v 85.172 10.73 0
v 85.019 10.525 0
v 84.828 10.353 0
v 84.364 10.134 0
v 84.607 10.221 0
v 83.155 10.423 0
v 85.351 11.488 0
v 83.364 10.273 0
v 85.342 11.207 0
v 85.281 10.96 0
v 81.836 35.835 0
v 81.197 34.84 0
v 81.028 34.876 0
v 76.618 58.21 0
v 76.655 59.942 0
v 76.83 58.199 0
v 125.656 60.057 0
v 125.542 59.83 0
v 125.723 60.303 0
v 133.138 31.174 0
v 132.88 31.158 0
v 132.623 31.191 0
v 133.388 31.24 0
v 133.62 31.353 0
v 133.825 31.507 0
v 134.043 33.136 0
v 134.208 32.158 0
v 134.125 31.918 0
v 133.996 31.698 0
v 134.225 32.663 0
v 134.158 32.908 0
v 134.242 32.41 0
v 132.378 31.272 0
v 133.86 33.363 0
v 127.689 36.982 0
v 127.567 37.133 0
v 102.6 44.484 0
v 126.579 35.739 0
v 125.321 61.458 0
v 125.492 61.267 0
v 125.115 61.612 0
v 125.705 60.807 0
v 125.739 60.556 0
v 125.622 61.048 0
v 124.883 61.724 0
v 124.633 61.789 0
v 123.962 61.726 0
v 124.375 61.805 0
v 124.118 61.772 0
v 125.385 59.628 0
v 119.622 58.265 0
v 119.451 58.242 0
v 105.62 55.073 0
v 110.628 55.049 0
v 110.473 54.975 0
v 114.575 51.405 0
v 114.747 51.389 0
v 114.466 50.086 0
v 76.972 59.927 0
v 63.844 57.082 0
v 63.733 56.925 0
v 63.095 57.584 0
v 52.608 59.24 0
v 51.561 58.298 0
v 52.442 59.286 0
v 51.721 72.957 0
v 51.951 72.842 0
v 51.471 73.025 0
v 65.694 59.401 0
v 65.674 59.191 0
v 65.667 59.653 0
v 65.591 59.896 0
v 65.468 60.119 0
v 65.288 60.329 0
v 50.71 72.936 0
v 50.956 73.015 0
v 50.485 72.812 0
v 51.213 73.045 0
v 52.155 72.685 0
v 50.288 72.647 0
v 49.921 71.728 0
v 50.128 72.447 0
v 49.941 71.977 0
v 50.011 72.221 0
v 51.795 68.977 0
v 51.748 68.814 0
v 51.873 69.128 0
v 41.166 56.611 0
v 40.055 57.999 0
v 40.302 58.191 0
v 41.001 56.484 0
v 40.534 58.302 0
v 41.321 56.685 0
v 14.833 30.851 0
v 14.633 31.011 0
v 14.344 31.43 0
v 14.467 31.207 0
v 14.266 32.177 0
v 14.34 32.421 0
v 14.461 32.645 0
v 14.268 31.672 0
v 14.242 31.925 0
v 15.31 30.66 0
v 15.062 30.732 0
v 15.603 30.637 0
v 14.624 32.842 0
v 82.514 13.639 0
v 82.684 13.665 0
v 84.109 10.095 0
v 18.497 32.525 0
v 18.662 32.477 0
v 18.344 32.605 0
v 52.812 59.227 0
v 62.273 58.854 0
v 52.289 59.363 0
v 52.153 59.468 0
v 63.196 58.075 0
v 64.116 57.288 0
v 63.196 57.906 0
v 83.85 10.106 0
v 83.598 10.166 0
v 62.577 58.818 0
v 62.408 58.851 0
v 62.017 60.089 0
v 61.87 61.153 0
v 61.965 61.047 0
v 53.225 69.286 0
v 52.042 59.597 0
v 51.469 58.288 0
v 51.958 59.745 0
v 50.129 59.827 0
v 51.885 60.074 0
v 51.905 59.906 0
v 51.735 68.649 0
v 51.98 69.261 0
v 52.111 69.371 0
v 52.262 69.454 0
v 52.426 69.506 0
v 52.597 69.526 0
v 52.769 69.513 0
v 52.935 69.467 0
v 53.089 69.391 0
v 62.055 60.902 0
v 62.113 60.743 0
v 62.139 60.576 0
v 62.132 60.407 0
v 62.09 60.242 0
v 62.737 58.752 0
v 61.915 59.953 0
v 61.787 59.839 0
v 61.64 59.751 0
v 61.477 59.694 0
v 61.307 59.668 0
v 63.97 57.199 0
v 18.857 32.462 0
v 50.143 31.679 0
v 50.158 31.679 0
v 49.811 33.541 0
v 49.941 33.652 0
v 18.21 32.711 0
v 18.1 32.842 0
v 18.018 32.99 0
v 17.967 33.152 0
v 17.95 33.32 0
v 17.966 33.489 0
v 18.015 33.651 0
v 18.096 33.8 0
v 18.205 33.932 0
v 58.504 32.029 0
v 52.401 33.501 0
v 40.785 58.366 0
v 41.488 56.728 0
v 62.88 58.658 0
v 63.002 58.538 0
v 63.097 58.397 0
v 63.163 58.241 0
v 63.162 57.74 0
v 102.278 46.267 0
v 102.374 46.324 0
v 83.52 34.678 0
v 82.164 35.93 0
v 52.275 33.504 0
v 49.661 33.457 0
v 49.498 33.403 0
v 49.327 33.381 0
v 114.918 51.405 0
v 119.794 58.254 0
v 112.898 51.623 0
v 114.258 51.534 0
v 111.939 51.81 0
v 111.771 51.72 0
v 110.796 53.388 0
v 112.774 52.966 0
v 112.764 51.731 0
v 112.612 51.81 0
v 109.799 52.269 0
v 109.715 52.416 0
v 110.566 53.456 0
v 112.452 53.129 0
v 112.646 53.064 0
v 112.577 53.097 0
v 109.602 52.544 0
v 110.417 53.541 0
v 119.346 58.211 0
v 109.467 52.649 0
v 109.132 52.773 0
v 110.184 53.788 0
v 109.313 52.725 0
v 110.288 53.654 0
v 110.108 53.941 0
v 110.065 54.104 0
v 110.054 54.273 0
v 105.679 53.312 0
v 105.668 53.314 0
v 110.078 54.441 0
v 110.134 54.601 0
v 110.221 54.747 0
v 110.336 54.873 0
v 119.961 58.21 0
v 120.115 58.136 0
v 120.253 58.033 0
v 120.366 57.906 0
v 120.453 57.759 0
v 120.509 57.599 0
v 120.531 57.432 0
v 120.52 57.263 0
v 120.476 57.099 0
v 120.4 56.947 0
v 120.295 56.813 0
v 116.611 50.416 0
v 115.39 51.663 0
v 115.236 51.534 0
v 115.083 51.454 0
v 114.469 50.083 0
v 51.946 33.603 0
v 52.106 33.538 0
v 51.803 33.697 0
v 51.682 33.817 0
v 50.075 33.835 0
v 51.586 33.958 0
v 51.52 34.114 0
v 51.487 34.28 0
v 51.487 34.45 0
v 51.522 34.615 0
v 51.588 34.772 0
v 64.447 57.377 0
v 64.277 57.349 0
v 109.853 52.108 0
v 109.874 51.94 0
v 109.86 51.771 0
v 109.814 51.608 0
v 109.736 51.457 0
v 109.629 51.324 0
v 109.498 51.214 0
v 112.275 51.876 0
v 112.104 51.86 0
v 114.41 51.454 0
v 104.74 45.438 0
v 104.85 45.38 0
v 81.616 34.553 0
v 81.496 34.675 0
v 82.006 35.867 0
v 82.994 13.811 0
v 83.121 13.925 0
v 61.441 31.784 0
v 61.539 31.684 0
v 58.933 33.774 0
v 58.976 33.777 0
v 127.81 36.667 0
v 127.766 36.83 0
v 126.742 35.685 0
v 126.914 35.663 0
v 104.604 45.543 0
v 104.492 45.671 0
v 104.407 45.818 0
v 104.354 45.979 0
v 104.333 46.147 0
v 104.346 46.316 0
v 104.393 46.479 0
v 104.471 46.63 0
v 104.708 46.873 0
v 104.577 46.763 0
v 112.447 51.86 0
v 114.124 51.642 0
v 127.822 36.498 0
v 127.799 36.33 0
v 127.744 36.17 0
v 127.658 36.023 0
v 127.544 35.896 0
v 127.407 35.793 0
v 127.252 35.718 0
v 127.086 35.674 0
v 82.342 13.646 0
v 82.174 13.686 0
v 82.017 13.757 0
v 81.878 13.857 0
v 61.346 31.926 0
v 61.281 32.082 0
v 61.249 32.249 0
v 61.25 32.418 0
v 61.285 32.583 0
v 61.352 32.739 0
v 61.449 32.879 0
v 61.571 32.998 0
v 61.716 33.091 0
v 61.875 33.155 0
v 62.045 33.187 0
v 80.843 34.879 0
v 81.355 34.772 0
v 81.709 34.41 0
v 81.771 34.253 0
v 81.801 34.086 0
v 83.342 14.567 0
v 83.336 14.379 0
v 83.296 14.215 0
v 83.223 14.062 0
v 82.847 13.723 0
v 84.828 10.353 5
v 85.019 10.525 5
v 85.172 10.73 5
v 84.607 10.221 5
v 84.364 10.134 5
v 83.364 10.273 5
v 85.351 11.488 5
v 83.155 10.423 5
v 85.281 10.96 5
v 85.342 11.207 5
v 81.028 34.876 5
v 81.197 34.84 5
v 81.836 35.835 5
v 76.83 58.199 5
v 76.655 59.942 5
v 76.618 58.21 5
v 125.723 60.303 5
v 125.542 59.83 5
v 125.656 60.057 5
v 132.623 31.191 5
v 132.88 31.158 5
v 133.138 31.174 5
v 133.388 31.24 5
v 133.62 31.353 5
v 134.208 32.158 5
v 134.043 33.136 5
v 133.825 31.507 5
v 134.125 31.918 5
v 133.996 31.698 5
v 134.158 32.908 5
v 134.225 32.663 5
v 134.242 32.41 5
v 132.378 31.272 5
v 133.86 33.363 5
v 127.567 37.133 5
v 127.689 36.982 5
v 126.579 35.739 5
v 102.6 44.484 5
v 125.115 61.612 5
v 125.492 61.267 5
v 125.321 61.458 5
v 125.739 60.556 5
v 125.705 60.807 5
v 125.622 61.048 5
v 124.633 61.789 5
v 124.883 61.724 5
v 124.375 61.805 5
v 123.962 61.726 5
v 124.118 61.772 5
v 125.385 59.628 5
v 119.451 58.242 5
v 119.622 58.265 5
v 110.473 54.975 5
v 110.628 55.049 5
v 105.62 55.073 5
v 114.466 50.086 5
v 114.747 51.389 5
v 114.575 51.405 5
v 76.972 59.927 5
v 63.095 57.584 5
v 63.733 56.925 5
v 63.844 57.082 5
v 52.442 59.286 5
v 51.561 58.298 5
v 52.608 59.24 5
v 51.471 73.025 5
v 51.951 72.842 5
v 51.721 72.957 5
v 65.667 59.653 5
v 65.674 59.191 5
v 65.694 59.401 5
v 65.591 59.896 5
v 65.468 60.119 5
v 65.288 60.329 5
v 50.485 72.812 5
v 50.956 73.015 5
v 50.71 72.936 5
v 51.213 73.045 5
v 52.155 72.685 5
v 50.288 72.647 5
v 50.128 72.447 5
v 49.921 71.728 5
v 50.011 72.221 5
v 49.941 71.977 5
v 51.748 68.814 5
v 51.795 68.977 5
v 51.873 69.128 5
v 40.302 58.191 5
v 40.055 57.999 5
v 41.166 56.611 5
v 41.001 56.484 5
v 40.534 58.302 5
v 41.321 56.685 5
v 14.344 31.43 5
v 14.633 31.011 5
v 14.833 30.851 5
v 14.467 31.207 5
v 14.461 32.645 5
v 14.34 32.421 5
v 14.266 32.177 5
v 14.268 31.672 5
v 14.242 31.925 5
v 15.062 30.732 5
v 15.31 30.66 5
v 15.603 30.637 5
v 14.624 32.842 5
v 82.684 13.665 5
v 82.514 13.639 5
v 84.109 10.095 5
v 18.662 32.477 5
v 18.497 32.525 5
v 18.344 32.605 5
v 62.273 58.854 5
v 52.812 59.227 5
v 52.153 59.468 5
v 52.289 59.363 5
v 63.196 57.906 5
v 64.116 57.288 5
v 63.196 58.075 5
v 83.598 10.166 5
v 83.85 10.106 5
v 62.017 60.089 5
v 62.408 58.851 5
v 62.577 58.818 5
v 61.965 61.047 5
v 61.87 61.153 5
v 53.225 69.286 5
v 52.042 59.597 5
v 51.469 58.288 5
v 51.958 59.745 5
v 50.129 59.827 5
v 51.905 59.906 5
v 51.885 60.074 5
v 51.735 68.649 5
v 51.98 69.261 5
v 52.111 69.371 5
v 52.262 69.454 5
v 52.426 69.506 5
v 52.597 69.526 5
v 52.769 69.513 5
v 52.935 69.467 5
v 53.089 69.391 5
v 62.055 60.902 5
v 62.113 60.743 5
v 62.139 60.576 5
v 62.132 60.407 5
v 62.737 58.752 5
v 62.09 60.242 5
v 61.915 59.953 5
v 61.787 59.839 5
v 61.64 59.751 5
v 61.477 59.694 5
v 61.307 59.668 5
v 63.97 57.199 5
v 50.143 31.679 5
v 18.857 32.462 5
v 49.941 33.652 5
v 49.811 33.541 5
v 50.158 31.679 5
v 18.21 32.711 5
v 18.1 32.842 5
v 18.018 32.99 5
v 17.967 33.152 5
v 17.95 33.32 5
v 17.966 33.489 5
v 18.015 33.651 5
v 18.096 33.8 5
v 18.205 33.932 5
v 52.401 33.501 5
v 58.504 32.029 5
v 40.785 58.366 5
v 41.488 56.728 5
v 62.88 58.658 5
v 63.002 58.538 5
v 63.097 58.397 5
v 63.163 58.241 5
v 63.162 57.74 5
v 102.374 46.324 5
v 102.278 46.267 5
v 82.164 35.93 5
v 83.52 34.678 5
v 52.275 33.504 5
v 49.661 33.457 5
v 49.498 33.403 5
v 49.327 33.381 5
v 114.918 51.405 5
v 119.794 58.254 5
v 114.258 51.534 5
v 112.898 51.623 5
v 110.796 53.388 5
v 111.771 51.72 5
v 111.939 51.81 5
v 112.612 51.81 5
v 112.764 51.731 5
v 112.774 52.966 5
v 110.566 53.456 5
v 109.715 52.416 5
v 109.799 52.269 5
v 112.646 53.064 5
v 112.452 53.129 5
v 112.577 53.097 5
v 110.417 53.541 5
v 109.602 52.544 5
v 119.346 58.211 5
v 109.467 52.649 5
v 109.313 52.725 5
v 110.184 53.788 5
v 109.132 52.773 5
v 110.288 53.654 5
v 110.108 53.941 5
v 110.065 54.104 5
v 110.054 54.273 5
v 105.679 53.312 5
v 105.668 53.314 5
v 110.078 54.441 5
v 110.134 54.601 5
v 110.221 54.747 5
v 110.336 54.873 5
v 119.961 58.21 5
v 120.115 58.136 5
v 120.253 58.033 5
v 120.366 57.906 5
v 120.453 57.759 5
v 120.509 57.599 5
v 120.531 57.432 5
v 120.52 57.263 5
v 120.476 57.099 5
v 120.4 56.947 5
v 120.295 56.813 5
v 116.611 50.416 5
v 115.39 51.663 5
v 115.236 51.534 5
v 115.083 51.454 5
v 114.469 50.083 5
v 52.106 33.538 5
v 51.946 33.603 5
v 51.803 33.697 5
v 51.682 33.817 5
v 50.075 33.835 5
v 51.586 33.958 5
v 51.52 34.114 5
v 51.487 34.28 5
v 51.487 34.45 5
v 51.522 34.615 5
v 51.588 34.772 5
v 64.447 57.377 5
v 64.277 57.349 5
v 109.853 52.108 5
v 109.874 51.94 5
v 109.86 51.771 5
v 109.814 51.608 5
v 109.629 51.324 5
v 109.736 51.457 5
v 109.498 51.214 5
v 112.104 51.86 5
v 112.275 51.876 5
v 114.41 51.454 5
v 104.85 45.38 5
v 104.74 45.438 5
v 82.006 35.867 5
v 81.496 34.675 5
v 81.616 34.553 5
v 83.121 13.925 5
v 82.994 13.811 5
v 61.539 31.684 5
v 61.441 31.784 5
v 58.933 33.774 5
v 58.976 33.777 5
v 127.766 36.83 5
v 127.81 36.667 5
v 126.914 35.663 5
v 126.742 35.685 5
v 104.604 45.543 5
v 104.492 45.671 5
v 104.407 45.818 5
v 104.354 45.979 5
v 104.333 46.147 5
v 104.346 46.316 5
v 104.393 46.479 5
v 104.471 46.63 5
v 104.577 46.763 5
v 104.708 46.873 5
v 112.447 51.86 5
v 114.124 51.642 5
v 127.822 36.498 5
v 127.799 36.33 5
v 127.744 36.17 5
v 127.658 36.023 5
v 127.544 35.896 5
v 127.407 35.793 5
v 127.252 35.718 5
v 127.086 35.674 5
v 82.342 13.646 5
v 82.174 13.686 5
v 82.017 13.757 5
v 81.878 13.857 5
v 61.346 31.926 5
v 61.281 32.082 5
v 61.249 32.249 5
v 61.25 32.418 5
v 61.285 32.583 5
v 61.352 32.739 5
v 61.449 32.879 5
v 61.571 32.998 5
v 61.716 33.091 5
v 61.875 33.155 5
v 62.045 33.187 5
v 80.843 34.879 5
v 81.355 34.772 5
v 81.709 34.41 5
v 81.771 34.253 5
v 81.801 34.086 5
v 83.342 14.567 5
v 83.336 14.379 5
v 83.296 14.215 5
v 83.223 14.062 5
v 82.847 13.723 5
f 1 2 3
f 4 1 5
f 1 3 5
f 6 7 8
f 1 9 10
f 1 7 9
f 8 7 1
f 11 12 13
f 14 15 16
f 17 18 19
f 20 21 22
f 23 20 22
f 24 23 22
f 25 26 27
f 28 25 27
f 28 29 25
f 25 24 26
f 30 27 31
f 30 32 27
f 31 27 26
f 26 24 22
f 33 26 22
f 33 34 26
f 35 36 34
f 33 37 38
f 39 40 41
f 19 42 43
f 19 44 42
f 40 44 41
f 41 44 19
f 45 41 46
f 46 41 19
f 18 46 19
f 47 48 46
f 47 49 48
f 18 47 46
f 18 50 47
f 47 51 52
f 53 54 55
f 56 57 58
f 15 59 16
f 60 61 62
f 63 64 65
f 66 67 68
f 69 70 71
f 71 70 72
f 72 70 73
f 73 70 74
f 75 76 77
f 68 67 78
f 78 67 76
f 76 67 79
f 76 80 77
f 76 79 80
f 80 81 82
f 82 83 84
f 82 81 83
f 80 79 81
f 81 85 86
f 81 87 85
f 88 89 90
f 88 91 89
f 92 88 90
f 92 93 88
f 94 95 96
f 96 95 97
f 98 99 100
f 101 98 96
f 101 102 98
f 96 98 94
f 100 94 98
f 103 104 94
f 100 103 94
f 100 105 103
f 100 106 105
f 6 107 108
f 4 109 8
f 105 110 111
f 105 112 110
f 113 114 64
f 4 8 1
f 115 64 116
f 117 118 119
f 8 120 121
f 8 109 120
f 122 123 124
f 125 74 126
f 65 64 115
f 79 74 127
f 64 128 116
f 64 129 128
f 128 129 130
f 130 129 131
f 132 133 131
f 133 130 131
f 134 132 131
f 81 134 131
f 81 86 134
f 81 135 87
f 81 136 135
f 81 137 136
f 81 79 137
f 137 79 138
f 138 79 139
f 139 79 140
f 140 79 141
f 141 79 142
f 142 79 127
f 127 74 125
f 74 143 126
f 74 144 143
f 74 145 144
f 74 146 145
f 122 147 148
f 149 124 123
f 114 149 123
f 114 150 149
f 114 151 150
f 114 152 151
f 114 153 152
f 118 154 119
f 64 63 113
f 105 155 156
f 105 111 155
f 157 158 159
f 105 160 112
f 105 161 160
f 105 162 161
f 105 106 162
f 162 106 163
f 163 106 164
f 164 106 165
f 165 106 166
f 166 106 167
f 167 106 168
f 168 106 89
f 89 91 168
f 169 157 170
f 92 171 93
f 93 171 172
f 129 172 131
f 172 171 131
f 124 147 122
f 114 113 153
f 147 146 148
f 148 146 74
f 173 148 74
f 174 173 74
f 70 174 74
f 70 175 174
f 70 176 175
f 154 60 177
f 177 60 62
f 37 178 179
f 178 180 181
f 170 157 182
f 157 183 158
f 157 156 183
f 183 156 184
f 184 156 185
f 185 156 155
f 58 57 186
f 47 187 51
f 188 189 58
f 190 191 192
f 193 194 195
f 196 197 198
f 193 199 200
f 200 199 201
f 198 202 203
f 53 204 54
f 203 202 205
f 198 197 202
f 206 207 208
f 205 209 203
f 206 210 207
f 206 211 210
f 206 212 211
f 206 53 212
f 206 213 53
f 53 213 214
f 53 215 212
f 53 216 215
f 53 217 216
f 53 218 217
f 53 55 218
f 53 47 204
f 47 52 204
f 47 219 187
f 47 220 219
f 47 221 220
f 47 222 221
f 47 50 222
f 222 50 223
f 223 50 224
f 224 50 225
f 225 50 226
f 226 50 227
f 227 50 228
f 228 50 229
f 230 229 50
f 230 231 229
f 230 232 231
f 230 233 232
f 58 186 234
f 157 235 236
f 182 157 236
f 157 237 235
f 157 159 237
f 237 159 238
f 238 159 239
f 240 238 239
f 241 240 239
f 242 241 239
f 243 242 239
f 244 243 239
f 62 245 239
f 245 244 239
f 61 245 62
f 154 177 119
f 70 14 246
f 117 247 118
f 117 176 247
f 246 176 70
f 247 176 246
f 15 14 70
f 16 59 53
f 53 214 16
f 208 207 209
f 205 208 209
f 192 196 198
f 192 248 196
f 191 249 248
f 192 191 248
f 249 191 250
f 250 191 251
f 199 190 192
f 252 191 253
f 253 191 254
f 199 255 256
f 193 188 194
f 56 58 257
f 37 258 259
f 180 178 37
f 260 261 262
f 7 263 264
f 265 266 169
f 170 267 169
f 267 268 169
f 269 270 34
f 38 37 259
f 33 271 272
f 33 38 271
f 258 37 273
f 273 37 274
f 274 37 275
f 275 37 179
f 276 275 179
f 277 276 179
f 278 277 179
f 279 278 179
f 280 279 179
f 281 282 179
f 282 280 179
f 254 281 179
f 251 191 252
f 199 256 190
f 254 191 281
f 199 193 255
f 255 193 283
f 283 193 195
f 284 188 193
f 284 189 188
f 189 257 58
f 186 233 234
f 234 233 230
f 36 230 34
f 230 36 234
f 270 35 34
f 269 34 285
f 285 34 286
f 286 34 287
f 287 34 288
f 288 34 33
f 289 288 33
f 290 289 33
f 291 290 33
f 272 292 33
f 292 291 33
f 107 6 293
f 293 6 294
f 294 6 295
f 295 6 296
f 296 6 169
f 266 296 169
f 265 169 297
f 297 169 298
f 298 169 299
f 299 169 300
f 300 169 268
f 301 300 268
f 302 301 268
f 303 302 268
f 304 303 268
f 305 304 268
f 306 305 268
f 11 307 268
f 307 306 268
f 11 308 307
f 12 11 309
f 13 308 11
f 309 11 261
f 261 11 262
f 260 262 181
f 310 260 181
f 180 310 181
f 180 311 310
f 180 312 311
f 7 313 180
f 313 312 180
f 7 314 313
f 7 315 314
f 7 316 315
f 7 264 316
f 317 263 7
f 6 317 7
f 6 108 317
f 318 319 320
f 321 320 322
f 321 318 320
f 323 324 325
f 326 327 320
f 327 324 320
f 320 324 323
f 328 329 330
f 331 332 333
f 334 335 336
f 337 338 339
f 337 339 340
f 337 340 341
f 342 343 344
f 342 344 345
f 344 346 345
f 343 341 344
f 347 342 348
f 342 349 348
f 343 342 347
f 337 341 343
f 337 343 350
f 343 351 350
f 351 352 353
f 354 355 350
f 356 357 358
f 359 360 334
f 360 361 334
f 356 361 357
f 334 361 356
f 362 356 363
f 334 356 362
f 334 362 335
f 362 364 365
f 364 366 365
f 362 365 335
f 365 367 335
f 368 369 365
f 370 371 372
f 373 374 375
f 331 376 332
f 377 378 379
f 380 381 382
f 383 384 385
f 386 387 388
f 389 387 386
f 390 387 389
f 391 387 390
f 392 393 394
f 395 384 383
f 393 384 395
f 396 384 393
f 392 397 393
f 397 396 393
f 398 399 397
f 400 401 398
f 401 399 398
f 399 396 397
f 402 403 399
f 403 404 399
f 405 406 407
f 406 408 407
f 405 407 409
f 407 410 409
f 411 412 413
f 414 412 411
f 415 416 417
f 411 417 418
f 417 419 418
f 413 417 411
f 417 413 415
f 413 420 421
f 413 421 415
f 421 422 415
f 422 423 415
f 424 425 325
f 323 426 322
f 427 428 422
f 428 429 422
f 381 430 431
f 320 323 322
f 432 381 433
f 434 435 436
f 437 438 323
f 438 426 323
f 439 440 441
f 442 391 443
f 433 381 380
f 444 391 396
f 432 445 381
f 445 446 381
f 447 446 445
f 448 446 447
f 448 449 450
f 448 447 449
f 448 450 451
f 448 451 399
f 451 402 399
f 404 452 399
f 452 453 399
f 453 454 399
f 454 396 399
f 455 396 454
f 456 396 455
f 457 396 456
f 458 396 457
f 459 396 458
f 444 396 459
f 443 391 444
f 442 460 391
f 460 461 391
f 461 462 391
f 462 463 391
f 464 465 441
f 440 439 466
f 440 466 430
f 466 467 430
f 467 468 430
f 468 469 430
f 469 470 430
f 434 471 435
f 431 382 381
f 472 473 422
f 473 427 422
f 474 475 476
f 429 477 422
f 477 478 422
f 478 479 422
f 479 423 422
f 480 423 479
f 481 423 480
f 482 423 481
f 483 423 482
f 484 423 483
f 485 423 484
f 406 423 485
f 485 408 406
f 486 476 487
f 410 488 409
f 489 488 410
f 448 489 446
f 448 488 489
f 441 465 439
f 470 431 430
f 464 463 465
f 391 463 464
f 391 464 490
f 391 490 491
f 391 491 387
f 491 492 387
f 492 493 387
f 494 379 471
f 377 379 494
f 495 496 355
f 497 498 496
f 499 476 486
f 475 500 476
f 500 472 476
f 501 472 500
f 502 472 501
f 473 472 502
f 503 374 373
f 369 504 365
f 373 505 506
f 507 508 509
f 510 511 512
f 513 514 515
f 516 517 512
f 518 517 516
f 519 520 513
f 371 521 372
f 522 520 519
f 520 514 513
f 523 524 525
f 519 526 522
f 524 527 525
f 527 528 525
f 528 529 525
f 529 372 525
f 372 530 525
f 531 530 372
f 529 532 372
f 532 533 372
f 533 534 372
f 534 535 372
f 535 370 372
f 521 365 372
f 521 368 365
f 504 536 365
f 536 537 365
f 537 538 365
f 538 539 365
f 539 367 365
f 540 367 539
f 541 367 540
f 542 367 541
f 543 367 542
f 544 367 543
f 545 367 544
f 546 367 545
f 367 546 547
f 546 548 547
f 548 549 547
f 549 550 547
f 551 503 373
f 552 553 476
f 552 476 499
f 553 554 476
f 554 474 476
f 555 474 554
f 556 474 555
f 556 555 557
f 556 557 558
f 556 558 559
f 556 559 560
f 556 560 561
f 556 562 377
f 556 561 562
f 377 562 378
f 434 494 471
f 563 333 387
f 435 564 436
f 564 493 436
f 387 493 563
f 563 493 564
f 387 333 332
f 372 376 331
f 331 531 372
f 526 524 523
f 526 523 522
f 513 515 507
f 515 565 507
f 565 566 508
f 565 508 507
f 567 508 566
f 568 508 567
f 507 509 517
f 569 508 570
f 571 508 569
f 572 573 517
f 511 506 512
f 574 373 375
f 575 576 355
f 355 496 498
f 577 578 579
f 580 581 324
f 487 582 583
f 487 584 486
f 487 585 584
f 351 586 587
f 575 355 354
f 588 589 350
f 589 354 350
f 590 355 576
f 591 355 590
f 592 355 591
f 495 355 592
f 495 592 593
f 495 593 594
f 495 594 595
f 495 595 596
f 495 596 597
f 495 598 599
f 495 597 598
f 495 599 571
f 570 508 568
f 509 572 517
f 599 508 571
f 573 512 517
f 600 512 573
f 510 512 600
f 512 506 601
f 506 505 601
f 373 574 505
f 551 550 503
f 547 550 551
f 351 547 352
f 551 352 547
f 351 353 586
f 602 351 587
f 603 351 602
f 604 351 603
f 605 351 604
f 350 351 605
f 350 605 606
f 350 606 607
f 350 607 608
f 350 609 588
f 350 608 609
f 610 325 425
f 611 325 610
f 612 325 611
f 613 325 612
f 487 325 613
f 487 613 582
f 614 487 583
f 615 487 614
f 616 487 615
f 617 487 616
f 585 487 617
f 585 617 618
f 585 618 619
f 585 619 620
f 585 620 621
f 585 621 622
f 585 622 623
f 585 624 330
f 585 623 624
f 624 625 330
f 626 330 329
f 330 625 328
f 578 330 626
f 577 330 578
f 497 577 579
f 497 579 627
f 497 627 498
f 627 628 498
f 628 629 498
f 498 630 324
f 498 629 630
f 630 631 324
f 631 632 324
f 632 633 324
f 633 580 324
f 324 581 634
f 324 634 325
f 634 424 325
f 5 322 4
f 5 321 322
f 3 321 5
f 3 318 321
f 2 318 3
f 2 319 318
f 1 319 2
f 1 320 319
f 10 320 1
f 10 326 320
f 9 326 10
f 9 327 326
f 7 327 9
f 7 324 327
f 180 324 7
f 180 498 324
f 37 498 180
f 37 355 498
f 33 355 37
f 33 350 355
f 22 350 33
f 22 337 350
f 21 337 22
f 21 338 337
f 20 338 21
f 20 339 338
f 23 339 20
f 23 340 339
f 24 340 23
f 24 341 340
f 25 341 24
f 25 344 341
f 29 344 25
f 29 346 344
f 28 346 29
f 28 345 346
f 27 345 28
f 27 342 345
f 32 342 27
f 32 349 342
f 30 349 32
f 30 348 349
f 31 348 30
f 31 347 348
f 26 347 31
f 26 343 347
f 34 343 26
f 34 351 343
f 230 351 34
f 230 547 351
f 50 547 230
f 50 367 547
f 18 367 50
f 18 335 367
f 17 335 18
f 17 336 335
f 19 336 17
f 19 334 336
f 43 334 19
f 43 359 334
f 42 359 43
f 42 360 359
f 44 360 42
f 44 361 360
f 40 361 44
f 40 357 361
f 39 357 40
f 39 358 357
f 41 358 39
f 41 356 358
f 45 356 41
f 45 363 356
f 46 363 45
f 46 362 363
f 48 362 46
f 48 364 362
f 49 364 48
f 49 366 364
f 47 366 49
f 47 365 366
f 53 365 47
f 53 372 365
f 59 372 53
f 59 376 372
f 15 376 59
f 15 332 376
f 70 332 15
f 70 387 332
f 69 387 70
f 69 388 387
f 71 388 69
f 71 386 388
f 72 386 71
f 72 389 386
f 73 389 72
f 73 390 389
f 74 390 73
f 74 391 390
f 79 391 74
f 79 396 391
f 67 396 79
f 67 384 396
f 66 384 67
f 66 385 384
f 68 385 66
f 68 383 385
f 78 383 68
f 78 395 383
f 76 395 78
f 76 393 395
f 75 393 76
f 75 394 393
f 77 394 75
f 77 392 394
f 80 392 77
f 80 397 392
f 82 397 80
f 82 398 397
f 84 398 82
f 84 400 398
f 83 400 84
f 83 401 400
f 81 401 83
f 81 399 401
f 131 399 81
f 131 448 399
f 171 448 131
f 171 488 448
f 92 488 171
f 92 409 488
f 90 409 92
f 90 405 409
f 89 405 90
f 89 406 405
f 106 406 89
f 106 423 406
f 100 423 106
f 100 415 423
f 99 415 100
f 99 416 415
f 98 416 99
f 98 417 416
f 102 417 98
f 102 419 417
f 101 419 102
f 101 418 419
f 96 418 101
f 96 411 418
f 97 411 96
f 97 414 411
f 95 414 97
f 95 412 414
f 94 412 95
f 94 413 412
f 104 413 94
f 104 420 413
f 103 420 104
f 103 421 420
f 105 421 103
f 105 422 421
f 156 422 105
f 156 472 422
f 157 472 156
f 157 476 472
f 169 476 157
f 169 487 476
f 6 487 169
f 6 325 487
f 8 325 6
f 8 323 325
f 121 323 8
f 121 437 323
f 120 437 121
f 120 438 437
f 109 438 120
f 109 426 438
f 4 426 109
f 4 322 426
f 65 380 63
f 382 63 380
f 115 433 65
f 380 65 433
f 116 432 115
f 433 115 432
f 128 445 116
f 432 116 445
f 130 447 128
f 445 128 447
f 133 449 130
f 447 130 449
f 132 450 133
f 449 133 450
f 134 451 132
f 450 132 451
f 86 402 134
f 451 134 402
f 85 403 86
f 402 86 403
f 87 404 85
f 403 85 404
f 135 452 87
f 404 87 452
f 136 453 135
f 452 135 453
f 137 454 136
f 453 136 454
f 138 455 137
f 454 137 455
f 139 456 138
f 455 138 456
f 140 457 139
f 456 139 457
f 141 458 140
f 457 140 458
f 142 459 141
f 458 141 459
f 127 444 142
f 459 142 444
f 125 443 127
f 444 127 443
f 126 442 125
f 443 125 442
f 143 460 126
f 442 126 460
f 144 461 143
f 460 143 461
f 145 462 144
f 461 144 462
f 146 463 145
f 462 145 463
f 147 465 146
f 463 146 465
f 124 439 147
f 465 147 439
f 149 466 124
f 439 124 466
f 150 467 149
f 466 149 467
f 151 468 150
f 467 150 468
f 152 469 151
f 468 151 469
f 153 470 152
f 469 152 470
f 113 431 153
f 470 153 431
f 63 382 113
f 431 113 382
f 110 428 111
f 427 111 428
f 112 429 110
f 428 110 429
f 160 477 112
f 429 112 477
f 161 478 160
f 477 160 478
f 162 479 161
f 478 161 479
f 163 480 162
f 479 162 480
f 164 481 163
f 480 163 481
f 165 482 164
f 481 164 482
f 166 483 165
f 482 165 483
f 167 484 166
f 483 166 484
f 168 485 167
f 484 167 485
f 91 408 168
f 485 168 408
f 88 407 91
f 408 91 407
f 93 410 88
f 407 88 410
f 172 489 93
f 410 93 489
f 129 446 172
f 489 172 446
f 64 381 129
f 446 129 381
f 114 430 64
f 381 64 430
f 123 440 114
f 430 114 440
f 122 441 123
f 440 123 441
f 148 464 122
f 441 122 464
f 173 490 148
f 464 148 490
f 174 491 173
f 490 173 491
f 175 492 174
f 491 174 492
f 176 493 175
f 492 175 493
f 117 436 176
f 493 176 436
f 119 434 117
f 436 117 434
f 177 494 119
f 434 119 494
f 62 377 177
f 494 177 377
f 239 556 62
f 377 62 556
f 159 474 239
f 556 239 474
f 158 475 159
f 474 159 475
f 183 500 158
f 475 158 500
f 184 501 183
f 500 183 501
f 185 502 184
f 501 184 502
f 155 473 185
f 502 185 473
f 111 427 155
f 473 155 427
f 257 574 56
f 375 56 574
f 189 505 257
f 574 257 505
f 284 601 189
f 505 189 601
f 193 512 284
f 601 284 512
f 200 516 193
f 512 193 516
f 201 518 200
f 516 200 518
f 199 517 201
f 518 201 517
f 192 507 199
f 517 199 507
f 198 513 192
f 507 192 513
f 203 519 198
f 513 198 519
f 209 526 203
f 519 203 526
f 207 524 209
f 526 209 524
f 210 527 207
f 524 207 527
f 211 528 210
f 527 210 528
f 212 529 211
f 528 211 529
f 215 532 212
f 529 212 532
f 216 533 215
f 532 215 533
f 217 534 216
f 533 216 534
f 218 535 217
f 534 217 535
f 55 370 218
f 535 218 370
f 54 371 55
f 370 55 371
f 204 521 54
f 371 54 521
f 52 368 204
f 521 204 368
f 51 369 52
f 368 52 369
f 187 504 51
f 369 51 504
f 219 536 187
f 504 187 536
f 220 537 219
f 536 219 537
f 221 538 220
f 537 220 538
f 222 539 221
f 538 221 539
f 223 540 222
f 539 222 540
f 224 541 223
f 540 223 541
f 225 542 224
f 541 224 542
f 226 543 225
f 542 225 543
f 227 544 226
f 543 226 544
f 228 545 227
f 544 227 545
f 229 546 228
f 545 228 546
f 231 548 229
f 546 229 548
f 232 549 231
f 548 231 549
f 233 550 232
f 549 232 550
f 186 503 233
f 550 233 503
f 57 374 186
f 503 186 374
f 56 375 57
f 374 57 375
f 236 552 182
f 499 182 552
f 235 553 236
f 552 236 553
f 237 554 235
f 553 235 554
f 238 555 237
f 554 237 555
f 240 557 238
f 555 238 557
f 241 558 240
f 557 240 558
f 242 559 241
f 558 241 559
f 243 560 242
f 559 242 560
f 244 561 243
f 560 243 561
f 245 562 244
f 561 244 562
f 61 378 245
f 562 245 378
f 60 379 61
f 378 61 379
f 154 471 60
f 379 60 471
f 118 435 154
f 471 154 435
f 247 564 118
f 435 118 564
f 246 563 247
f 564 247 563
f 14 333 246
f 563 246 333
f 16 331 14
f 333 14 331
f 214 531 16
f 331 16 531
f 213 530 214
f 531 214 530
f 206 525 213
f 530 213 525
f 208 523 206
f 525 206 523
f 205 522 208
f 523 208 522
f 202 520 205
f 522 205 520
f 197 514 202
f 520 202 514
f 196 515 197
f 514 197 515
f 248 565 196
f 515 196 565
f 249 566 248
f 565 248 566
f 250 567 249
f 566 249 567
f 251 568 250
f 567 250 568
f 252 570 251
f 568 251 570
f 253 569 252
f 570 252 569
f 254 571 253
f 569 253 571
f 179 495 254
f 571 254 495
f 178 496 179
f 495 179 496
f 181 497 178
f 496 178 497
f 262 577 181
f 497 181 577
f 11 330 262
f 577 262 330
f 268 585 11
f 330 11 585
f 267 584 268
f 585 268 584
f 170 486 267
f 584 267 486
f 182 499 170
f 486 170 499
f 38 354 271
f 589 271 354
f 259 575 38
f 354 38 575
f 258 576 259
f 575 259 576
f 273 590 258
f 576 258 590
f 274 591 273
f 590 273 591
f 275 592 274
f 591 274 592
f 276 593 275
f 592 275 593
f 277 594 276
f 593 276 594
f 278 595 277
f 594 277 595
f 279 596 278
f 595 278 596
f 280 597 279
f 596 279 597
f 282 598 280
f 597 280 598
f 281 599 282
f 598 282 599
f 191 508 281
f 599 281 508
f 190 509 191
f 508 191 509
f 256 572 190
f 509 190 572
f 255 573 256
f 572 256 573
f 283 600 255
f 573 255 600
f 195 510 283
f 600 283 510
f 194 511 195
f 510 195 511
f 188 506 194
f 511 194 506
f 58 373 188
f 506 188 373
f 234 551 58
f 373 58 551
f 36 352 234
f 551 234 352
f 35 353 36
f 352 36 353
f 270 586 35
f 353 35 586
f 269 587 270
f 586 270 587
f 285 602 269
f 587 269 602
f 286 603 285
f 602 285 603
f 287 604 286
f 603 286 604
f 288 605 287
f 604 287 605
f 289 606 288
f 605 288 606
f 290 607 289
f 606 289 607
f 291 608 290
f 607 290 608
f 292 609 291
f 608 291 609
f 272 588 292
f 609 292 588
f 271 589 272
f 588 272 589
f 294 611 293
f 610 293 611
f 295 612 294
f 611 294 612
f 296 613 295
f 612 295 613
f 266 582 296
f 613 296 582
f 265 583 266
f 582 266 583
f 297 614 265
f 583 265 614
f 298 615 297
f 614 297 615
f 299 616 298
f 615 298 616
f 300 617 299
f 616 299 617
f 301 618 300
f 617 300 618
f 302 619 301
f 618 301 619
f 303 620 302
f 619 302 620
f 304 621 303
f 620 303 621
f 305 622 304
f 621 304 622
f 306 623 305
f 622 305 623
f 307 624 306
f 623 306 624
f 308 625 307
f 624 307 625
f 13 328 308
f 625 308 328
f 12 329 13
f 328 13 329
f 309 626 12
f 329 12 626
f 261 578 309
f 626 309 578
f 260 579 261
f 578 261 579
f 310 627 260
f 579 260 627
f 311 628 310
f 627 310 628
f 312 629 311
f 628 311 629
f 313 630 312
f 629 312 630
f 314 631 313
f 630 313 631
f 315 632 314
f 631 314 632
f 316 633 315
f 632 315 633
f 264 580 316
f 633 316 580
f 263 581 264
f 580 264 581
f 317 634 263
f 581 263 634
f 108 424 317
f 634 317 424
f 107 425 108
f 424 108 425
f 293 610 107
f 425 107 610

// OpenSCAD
/*
 * Customizable Origami - Shark - https://www.thingiverse.com/thing:2736967
 * by Dennis Hofmann - https://www.thingiverse.com/mightynozzle/about
 * created 2017-12-29
 * version v1.0
 *
 * Changelog
 * --------------
 * v1.0:
 *      - final design
 * --------------
 * 
 * This work is licensed under the Creative Commons - Attribution - NonCommercial - ShareAlike license.
 * https://creativecommons.org/licenses/by-nc-sa/3.0/
 */


 // Parameter Section //
//-------------------//

// preview[view:north, tilt:top]

// The maximum size of the longest side. The shorter side will be automatically resized in same ratio.
max_size_in_millimeter = 120; //[20:300]

// The height of the model.
model_height_in_millimeter = 5; //[0.2:0.2:100]

// Thickness of the outer outline.
outline_size_in_millimeter = 1.8; //[0.5:0.1:20]

// Thickness of the inner outline.
inline_size_in_millimeter = 0.9; //[0.5:0.1:20]

// Roundiness of the ends of the inner outlines.
inline_edge_radius_in_millimeter = 0.9; //[0.0:0.1:5]

// Flip model
flip_model = "no"; //[yes,no]

/*[hidden]*/
max_size = max_size_in_millimeter;
model_height = model_height_in_millimeter;
$fn=32;

// Outer Points
A1 = [205, 429];
A2 = [660, 443];
A3 = [777, 448];
A4 = [1107, 153];
A5 = [1082, 476];
A6 = [1351, 617];
A7 = [1751, 436];
A8 = [1512, 677];
A9 = [1639, 813];
A10 = [1393, 722];
A11 = [1011, 788];
A12 = [839, 776];
A13 = [848, 798];
A14 = [675, 964];
A15 = [678, 789];
A16 = [540, 767];

outline = [A1, A2, A3, A4, A5, A6, A7, A8, A9, A10, A11, A12, A13, A14, A15, A16];

// Inner Points
B1 = [1481, 708];

// Polygons
C1 = [A3, A4, A5];
C2 = [A1, A2, A12, A13, A15, A16];
C3 = [A15, A14, A13];
C4 = [A2, A3, A5, A6, B1, A10, A11, A12];
C5 = [A6, A7, A8, B1];
C6 = [A8, A9, A10, B1];

cut_polygons = [C1, C2, C3, C4, C5, C6];

min_x = A1[0];
min_y = A4[1];
max_x = A7[0];
max_y = A14[1];

x_size = max_x - min_x;
y_size = max_y - min_y;

x_factor = max_size / x_size;
y_factor = max_size / y_size;

inline_size = x_size > y_size ? inline_size_in_millimeter / x_factor / 2: inline_size_in_millimeter / y_factor / 2;
inline_edge_radius = x_size > y_size ? inline_edge_radius_in_millimeter / x_factor: inline_edge_radius_in_millimeter / y_factor;
outline_size = x_size > y_size ? outline_size_in_millimeter / x_factor - inline_size: outline_size_in_millimeter / y_factor - inline_size;


 // Program Section //
//-----------------//

if(x_size > y_size) {
    resize(newsize=[max_size, x_factor * y_size, model_height]){
        if(flip_model == "yes") {
            mirror([0,1,0]) {
                rotate([180,180,0]) {    
                    create(outline, cut_polygons);
                }
            }
        } else {
            create(outline, cut_polygons);
        }
    }
} else {
    resize(newsize=[y_factor * x_size, max_size, model_height]){
        if(flip_model == "yes") {
            mirror([0,1,0]) {
                rotate([180,180,0]) {    
                    create(outline, cut_polygons);
                }
            }
        } else {
            create(outline, cut_polygons);
        }
    }
}


 // Module Section //
//----------------//

module create() {
    linear_extrude(height=1) {
        difference() {
            offset(r = -0) {
                offset(r = +outline_size) {
                    polygon(points = outline, convexity = 10);
                }
            }
            
            for(cut_polygon = [0:len(cut_polygons)]) {
                offset(r = +inline_edge_radius) {
                    offset(r = -inline_size - inline_edge_radius) {
                        polygon(points = cut_polygons[cut_polygon], convexity = 10);
                    }
                }
            }
        }
    }
}
